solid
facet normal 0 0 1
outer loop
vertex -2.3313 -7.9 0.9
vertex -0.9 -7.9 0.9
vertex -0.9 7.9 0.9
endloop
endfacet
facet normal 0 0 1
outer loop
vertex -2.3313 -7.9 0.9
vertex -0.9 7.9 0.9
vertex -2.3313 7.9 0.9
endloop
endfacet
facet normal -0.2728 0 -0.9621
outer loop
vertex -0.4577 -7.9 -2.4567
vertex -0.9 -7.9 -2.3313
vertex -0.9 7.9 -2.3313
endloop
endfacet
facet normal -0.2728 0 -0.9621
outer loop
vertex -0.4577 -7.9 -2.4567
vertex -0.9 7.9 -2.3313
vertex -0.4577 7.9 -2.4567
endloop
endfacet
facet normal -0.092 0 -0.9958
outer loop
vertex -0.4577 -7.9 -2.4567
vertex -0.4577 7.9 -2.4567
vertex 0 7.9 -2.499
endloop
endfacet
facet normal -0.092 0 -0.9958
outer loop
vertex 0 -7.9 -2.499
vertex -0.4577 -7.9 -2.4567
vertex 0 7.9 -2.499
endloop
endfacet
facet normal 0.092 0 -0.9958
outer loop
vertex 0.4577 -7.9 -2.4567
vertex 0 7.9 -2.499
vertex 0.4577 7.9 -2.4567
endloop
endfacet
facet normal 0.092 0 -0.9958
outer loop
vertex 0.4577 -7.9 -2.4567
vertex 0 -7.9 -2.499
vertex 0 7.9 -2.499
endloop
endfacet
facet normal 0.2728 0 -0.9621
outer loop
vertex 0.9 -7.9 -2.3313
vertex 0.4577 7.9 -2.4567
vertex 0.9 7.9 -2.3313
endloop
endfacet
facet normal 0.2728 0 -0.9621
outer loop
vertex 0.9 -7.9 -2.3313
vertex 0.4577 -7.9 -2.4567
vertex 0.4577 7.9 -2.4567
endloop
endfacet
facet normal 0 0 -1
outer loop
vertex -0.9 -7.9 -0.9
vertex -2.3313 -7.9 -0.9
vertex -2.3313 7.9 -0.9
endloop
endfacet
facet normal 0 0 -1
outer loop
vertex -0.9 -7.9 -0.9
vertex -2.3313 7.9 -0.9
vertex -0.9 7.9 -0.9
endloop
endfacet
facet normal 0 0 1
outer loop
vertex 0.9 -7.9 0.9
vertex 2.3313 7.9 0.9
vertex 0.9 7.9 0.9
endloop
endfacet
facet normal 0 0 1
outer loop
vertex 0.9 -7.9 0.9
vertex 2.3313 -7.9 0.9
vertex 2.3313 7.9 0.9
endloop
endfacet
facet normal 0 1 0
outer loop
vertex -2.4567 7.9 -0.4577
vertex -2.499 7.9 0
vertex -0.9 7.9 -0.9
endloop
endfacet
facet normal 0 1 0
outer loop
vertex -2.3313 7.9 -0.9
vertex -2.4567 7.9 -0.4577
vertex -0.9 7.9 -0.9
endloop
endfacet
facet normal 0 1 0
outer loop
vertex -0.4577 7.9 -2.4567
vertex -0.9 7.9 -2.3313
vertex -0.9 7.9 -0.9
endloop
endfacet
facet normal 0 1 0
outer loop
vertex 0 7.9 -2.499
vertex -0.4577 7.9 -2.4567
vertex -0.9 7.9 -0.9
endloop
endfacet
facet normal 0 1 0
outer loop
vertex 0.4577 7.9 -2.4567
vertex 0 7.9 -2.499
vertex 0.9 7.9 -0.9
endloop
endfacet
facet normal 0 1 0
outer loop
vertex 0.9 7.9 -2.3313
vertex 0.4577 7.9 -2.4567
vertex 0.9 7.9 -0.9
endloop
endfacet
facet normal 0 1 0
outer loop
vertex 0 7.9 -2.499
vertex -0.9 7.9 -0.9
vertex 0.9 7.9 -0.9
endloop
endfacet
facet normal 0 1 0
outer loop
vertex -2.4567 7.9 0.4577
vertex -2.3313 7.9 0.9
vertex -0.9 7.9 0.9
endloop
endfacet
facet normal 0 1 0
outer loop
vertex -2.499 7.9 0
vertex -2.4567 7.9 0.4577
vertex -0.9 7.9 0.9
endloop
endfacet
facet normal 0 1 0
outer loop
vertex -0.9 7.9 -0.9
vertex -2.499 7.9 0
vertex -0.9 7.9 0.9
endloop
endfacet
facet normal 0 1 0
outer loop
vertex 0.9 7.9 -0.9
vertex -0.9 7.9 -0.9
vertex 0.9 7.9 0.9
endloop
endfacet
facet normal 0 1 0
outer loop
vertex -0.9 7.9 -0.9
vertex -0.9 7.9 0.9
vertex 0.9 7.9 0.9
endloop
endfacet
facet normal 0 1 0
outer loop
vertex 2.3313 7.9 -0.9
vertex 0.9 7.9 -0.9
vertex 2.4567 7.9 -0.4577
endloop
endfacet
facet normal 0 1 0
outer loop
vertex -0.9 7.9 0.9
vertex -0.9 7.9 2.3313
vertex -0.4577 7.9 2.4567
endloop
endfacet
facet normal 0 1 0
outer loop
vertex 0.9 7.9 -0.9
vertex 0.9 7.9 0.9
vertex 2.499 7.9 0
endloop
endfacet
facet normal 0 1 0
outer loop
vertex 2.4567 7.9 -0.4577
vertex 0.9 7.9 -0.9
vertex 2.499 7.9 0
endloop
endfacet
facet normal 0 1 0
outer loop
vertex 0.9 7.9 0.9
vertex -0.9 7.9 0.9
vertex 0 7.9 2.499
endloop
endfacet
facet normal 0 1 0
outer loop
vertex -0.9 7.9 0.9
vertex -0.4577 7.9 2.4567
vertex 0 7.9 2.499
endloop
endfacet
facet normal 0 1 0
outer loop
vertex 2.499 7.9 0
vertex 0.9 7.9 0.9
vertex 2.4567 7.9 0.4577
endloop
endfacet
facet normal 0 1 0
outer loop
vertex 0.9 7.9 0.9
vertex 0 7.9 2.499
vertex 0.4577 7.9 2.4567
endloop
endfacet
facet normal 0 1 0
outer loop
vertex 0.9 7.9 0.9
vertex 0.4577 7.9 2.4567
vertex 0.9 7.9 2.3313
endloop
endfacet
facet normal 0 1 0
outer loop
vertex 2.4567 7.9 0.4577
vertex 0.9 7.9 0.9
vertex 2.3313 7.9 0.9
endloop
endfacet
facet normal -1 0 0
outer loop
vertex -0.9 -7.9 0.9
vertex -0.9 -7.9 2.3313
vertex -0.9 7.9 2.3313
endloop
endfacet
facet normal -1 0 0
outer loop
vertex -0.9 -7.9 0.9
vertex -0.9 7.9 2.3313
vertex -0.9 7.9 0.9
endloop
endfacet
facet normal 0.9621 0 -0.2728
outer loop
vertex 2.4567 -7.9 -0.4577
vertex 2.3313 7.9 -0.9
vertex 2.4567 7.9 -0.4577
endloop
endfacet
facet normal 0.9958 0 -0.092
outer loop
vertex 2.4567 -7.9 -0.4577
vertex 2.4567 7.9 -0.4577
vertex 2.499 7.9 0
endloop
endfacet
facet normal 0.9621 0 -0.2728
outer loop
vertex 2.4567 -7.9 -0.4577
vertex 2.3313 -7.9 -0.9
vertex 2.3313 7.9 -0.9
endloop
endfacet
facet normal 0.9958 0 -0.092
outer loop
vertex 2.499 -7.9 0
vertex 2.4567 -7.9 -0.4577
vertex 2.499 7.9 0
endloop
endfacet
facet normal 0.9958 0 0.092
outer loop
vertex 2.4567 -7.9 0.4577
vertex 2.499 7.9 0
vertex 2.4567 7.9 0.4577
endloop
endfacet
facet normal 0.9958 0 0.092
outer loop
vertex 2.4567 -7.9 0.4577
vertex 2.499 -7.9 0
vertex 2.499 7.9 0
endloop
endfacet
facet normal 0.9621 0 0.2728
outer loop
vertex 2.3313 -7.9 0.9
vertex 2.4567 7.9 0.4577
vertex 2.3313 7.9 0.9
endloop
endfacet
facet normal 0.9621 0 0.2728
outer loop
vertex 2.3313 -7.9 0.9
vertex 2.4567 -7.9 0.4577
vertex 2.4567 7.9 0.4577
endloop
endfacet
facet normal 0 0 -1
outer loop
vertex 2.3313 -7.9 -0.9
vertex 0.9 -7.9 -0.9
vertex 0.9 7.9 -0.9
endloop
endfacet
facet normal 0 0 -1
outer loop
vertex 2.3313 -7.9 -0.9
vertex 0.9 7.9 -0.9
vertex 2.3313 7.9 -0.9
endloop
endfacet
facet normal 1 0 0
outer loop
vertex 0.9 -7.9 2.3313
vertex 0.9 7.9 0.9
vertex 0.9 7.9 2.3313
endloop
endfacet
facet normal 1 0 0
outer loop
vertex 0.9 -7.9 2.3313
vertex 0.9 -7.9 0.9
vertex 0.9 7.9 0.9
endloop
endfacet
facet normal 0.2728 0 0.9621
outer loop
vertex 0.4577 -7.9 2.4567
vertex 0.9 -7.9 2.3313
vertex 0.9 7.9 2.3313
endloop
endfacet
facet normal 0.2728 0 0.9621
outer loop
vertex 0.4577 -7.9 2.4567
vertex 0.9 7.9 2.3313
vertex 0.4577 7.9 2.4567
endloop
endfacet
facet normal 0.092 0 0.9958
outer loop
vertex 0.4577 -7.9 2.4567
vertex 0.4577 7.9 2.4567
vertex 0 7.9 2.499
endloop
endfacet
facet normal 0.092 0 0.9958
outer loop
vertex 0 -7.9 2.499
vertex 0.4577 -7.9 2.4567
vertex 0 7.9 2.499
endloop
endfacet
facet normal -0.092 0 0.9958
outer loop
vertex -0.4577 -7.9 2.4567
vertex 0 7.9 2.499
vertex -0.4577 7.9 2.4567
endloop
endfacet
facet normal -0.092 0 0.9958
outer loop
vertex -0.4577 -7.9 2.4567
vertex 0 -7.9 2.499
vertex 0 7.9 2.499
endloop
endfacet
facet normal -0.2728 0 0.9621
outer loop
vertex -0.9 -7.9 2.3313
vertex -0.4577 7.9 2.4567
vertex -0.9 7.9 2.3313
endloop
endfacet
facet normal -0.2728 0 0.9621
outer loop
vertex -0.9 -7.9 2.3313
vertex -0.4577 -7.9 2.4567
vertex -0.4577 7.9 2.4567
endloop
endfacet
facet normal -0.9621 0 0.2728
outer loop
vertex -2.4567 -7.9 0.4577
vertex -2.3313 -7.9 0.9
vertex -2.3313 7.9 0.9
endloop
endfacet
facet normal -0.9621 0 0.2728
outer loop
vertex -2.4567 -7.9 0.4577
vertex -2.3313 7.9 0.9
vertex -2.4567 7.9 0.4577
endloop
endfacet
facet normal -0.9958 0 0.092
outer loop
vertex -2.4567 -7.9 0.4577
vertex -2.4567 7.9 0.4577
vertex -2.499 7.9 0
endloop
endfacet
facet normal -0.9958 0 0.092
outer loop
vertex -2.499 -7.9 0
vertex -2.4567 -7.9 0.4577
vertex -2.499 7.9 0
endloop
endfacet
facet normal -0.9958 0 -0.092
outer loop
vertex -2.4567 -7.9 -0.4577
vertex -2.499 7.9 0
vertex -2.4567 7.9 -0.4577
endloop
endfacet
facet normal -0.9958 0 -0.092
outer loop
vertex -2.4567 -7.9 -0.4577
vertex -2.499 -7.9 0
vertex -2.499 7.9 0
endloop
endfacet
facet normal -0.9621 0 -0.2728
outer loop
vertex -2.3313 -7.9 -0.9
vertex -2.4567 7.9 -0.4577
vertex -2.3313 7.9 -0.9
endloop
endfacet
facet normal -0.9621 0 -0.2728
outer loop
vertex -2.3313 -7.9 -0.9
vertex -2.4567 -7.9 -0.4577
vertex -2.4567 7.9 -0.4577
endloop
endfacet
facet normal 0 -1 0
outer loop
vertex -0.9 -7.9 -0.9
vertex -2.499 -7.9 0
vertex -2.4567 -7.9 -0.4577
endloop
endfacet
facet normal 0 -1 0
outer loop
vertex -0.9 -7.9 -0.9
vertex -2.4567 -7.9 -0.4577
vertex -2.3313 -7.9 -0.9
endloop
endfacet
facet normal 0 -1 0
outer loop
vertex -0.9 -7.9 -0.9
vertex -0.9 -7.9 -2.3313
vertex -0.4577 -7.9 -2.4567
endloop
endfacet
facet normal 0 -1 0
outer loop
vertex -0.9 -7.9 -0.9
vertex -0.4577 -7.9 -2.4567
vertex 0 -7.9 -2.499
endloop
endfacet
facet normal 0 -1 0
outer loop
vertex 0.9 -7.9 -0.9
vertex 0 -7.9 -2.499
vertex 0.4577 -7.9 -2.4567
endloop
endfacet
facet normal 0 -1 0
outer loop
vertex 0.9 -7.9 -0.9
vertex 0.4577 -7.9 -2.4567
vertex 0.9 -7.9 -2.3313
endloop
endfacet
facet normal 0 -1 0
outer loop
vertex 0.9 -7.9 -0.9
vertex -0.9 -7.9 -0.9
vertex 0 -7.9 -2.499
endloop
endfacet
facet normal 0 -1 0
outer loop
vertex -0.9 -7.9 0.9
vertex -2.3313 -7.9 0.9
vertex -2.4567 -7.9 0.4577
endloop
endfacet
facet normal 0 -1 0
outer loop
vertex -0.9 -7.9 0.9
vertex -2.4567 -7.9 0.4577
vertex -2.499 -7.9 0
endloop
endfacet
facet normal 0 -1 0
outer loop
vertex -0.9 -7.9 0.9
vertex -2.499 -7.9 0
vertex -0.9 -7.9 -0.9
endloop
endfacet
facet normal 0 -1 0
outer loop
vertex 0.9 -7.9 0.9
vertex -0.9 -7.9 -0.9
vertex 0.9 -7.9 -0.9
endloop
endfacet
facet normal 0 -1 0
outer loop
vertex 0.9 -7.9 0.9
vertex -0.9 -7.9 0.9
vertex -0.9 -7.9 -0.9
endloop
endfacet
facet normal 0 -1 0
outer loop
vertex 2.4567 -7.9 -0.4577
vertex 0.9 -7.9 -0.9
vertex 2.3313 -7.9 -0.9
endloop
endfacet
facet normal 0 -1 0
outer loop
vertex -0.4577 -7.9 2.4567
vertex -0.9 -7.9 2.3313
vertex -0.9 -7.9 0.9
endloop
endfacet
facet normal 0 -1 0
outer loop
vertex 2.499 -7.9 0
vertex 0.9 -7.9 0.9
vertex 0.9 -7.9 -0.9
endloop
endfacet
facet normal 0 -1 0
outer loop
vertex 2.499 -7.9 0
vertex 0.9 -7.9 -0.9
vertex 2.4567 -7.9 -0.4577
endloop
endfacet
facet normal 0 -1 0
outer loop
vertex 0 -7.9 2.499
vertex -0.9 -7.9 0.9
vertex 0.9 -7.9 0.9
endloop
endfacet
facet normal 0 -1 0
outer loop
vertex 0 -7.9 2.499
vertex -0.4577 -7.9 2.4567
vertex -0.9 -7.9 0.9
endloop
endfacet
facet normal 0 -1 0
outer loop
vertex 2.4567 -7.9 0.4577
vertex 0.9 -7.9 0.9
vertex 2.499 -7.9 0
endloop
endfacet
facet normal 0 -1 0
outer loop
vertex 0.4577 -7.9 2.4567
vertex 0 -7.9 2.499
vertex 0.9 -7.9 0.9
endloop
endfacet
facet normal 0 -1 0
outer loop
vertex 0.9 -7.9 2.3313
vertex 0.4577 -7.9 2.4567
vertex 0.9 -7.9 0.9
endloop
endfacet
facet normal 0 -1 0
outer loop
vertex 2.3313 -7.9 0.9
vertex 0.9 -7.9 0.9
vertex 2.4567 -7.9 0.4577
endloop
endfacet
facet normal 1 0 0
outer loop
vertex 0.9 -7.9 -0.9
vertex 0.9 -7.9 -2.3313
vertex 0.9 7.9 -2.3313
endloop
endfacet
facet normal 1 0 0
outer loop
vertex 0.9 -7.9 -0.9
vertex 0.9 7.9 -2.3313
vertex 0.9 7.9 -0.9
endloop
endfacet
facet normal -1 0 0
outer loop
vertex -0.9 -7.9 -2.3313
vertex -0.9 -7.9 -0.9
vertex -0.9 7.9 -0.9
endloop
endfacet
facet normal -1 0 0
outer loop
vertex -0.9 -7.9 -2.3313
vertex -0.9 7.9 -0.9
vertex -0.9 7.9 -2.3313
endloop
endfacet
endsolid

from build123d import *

# Parameters (mm, degrees)
F0_W     = 1.8
F0_H     = 1.8
F1_DEPTH = 7.9


with BuildPart() as f1:
    # F0 (on Front) → F1 (new body, symmetric)
    with BuildSketch(Plane.XZ):
        with BuildLine():
            Line((0.9, 0.9), (0.9, 2.3313088598))
            ThreePointArc((0.9, 2.3313088598), (0, 2.499), (-0.9, 2.3313088598))
            Line((-0.9, 2.3313088598), (-0.9, 0.9))
            Line((-0.9, 0.9), (0.9, 0.9))
        make_face()
        with BuildLine():
            Line((2.3313088598, 0.9), (0.9, 0.9))
            Line((0.9, 0.9), (0.9, -0.9))
            Line((0.9, -0.9), (2.3313088598, -0.9))
            ThreePointArc((2.3313088598, -0.9), (2.499, 0), (2.3313088598, 0.9))
        make_face()
        Rectangle(F0_W, F0_H)
        with BuildLine():
            Line((0.9, -2.3313088598), (0.9, -0.9))
            Line((0.9, -0.9), (-0.9, -0.9))
            Line((-0.9, -0.9), (-0.9, -2.3313088598))
            ThreePointArc((-0.9, -2.3313088598), (0, -2.499), (0.9, -2.3313088598))
        make_face()
        with BuildLine():
            Line((-0.9, -0.9), (-0.9, 0.9))
            Line((-0.9, 0.9), (-2.3313088598, 0.9))
            ThreePointArc((-2.3313088598, 0.9), (-2.499, 0), (-2.3313088598, -0.9))
            Line((-2.3313088598, -0.9), (-0.9, -0.9))
        make_face()
    extrude(amount=F1_DEPTH, both=True)


solid = f1.part
